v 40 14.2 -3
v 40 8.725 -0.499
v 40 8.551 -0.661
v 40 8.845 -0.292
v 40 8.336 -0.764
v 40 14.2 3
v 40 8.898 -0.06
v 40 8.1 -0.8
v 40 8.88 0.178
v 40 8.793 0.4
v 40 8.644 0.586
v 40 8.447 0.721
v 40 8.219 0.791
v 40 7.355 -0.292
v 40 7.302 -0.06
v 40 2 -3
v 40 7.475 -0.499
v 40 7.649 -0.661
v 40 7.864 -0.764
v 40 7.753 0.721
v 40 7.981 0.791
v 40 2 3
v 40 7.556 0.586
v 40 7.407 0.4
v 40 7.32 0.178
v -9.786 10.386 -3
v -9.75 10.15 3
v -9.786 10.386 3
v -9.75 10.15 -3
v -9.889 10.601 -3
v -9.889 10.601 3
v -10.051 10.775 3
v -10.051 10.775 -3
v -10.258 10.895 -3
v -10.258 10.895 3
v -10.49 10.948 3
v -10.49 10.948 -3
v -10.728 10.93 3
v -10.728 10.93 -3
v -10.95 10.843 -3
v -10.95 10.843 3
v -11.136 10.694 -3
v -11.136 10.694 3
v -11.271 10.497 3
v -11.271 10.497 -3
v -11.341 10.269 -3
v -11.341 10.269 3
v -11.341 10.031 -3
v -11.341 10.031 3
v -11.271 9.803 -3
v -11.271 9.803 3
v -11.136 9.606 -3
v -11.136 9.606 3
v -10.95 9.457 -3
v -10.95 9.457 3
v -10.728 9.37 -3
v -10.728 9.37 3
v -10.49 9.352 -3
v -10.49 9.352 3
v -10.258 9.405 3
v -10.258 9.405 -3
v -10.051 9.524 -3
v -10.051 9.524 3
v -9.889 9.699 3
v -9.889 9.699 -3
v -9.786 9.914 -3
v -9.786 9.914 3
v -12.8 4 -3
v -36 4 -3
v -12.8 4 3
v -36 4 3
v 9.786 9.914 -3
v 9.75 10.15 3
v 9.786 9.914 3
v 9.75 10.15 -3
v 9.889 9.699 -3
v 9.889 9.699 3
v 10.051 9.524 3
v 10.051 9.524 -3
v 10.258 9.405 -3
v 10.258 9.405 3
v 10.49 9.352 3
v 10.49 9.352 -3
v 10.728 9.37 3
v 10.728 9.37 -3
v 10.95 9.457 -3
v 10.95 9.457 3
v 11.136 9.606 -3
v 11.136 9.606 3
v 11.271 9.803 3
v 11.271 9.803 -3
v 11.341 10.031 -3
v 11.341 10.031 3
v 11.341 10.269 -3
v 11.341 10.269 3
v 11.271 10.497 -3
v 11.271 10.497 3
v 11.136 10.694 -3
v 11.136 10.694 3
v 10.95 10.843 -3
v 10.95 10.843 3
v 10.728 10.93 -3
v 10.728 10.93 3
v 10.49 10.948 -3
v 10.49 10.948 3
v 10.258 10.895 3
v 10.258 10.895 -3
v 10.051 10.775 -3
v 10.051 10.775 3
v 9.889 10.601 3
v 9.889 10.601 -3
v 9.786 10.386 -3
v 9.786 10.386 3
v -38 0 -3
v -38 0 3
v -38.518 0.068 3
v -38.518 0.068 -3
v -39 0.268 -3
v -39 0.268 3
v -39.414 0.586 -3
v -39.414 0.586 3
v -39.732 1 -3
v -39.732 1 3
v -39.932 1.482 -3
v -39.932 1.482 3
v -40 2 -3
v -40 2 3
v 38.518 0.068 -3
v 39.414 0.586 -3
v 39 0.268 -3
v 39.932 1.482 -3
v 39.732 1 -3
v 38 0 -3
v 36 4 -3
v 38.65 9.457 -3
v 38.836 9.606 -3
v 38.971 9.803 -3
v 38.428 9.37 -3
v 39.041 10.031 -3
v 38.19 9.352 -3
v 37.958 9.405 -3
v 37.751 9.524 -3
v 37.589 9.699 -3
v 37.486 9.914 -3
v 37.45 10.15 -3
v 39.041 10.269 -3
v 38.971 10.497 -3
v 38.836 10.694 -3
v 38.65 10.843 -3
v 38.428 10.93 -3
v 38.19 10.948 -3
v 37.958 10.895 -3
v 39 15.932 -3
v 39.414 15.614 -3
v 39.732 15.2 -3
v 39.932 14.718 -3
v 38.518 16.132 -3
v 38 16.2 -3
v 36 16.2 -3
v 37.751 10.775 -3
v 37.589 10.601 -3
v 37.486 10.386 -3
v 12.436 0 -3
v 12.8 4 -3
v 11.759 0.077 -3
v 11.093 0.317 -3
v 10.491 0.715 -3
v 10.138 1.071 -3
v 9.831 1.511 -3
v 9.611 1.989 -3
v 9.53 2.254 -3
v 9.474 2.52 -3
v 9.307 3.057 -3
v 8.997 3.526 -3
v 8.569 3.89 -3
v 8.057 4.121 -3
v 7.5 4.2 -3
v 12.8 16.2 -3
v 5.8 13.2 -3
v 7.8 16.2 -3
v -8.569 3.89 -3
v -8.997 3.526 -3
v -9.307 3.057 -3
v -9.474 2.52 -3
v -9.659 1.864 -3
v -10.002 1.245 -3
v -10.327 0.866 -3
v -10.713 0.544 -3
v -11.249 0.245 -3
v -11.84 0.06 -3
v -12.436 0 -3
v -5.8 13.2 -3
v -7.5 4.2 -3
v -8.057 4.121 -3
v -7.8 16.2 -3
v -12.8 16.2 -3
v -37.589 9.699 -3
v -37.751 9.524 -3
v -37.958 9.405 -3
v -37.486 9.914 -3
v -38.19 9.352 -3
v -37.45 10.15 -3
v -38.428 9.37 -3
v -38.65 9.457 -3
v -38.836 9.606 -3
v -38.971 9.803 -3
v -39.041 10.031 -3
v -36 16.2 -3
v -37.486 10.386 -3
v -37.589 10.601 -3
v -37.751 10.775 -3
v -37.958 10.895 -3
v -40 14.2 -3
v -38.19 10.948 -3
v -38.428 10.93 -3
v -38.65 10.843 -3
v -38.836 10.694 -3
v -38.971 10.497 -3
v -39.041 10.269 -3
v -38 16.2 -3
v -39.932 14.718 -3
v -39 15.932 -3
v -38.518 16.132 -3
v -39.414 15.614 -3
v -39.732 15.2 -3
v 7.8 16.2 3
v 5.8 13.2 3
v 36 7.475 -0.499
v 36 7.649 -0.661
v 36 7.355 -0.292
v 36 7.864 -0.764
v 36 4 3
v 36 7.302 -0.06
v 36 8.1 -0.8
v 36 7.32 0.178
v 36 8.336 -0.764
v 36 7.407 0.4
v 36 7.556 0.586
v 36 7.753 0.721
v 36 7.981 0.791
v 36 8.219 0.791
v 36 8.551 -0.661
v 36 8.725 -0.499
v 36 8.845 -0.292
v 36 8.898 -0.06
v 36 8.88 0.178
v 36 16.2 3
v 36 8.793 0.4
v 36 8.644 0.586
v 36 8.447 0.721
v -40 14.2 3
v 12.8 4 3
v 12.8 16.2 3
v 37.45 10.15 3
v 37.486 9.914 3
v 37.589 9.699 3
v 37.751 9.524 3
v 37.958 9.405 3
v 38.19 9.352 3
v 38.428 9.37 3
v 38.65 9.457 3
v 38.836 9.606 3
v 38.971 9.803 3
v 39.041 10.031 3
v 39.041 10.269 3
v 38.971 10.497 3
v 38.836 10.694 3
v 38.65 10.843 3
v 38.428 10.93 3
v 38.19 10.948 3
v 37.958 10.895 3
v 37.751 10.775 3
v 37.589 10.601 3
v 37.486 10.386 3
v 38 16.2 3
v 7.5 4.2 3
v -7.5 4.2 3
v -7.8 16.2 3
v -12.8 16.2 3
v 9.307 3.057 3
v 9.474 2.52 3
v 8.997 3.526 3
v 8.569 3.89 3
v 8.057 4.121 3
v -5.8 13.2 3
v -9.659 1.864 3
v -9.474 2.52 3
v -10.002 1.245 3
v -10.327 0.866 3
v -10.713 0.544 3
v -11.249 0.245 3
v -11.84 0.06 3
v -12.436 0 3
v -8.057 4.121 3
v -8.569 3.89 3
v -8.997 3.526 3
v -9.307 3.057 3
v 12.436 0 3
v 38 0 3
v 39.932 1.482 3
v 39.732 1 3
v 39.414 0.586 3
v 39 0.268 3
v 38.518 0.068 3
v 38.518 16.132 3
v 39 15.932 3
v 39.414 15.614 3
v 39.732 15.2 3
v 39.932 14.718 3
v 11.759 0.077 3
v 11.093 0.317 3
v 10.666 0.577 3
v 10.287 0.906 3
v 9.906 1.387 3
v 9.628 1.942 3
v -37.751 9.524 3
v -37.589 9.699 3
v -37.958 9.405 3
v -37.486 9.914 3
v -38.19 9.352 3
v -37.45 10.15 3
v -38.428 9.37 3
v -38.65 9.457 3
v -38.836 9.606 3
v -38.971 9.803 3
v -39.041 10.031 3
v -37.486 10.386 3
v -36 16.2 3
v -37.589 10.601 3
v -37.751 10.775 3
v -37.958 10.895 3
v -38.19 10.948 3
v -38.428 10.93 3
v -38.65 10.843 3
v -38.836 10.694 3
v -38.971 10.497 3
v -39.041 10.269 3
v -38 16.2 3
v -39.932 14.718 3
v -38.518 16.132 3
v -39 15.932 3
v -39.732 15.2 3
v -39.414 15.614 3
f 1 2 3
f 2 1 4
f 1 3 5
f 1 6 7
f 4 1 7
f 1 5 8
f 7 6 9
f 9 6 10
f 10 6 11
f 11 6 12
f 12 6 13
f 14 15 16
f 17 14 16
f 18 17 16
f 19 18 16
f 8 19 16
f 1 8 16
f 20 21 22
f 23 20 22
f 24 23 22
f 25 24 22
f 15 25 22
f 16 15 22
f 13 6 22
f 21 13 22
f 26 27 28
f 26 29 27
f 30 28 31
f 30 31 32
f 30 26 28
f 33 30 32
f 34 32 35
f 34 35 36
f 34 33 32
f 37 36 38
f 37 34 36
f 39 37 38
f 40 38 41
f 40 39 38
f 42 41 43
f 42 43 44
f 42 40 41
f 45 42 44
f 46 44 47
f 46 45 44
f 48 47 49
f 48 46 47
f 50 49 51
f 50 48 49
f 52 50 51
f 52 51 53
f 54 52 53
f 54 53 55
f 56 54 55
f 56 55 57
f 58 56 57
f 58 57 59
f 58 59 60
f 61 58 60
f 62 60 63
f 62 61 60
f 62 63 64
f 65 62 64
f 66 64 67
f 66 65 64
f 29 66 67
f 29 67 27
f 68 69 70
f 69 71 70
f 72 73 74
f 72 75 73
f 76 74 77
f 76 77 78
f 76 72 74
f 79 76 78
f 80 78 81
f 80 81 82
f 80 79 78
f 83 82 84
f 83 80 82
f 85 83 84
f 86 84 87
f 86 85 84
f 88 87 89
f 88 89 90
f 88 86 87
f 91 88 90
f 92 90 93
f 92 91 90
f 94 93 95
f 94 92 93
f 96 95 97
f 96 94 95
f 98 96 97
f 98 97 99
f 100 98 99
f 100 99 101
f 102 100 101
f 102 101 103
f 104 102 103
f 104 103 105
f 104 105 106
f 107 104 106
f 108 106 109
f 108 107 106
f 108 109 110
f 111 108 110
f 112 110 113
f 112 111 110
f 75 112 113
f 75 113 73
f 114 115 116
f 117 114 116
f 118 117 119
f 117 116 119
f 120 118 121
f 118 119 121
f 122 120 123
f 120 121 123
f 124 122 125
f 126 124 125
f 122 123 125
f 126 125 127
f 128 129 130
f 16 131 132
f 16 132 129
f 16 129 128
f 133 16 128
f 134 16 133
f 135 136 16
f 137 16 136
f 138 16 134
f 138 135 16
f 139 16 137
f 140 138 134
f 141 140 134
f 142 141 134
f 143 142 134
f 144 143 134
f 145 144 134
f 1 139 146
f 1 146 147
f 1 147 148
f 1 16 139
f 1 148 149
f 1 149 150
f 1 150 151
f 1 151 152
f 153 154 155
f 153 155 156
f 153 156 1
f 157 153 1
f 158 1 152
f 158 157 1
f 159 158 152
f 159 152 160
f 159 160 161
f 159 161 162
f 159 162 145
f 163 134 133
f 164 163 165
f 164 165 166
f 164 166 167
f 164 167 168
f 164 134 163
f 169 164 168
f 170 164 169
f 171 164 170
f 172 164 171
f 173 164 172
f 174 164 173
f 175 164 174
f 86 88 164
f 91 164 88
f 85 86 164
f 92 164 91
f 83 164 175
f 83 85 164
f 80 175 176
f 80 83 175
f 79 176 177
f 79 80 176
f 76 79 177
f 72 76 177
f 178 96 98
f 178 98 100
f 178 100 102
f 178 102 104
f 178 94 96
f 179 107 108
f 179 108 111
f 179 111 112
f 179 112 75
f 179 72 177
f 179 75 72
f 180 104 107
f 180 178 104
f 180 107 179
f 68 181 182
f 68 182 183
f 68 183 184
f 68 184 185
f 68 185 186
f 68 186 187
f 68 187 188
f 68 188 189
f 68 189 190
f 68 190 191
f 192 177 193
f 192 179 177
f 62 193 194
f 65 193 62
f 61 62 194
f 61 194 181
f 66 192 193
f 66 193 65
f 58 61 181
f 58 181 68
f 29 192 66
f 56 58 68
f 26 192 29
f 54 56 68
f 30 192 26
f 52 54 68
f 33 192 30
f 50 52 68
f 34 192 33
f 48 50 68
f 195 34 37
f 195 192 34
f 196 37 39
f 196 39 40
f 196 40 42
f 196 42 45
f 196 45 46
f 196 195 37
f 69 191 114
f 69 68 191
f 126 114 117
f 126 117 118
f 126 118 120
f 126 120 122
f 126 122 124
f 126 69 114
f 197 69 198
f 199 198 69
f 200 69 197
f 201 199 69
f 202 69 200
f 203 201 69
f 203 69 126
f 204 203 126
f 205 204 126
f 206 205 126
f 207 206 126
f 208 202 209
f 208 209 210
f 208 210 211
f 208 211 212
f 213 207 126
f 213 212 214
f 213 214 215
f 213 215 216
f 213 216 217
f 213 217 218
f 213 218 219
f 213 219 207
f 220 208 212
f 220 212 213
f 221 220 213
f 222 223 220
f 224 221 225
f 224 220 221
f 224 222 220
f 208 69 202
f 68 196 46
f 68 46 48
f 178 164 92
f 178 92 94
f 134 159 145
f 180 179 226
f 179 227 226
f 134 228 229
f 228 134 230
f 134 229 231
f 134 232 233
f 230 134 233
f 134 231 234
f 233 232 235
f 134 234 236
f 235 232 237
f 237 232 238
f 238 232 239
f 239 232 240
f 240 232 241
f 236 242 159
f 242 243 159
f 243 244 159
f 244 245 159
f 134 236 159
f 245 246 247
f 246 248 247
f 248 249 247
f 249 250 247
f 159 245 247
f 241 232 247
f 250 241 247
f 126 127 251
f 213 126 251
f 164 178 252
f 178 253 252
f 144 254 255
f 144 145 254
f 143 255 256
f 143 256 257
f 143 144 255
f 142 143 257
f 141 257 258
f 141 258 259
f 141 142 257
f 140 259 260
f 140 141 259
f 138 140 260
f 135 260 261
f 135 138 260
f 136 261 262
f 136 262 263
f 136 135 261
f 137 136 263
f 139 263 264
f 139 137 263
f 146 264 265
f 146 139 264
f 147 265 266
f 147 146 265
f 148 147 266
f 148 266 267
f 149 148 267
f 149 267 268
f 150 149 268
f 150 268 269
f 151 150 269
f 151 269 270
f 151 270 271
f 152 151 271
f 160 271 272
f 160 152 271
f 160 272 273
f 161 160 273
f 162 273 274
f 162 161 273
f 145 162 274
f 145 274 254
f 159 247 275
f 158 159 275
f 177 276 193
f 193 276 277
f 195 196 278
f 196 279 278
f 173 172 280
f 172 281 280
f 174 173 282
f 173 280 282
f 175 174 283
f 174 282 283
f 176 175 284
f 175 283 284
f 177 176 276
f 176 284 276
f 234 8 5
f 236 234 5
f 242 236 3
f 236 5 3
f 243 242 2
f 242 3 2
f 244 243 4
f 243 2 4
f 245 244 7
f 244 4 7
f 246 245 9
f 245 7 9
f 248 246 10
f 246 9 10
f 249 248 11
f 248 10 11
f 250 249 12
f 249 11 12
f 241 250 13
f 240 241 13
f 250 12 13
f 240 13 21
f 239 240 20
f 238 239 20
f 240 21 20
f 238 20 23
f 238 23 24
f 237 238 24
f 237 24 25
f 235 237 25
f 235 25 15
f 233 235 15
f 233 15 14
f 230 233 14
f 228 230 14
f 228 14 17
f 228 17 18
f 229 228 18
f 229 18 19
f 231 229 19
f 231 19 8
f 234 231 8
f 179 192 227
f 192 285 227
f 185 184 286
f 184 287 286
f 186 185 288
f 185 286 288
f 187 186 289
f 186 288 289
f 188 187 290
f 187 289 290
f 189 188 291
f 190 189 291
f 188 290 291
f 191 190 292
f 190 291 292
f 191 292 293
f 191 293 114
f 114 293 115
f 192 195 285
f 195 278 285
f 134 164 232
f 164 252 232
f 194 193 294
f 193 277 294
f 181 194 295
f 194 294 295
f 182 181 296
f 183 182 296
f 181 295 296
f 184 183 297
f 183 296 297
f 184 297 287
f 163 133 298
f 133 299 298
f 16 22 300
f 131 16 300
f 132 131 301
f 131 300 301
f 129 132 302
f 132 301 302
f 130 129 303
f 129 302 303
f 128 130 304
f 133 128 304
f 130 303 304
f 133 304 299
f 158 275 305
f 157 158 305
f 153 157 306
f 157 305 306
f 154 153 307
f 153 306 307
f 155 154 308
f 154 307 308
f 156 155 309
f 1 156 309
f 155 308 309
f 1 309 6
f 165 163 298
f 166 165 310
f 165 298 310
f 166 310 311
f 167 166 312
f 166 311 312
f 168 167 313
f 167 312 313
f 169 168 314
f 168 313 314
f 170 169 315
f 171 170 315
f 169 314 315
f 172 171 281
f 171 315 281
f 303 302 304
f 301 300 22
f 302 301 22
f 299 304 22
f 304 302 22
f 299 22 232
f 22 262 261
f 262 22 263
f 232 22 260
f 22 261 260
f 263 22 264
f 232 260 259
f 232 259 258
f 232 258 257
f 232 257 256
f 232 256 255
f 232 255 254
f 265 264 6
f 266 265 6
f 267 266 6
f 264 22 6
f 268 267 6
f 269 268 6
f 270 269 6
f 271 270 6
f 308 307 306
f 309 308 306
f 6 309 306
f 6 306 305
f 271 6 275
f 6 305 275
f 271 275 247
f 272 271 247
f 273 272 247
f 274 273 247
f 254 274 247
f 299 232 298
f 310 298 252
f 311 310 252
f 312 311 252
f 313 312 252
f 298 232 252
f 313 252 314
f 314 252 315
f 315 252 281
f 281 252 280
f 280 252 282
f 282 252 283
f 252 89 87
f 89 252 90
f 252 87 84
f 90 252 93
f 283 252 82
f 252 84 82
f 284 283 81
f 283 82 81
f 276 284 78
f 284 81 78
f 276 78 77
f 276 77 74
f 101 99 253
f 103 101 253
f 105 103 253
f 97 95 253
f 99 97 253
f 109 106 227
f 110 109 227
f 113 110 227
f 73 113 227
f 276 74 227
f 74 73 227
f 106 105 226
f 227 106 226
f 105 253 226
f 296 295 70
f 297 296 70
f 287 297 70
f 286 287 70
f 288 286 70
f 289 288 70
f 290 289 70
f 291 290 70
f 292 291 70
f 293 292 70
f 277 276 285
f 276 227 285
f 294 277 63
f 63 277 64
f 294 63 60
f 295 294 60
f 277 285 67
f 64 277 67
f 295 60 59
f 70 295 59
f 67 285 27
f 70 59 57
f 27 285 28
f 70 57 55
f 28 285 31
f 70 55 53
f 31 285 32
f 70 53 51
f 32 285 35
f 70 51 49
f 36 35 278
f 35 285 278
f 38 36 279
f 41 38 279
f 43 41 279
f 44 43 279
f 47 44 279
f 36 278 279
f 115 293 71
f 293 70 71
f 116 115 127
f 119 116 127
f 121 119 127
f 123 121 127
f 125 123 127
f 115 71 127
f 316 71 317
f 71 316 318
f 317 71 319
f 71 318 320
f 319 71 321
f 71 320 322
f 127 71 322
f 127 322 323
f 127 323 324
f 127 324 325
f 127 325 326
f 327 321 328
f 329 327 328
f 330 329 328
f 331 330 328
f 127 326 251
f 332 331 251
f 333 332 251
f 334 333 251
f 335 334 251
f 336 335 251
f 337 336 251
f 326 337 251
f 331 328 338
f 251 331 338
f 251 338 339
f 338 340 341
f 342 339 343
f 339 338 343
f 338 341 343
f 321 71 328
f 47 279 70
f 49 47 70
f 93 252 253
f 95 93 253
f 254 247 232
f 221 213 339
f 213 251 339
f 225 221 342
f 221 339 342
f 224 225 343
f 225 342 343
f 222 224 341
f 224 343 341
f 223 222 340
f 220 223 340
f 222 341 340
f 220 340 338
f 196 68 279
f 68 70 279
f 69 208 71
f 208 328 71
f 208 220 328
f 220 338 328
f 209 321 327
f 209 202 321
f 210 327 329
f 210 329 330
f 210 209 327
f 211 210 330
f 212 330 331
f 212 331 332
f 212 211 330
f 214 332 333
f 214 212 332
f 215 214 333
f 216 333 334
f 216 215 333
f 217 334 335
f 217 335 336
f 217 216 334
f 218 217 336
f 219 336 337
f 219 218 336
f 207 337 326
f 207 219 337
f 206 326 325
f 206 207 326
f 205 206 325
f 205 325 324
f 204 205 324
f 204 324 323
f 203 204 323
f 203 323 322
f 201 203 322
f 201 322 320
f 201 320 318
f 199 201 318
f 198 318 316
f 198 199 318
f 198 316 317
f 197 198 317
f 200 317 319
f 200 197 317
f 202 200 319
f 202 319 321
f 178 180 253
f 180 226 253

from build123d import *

# Parameters (mm, degrees)
IZIM1_R                     = 0.8
Y_KSEKLIK_EKSTR_ZYON1_DEPTH = 3
RADYUS1_R                   = 3
KES_EKSTR_ZYON5_REACH       = 83.679
IZIM6_R                     = 0.8


with BuildPart() as part:
    # Çizim1 → Yükseklik-Ekstrüzyon1 (new, symmetric)
    with BuildSketch(Plane.XY):
        with BuildLine():
            Line((-40, 2), (-40, 14.2))
            ThreePointArc((-40, 14.2), (-39.414213562, 15.614213562), (-38, 16.2))
            Line((-38, 16.2), (-36, 16.2))
            Line((-36, 16.2), (-36, 4))
            Line((-36, 4), (-12.8, 4))
            Line((-12.8, 4), (-12.8, 16.2))
            Line((-12.8, 16.2), (-7.8, 16.2))
            Line((-7.8, 16.2), (-5.8, 13.199942957))
            Line((-5.8, 13.199942957), (5.8, 13.199942957))
            Line((5.8, 13.199942957), (7.8, 16.2))
            Line((7.8, 16.2), (11, 16.2))
            Line((11, 16.2), (12.8, 16.2))
            Line((12.8, 16.2), (12.8, 4))
            Line((12.8, 4), (36, 4))
            Line((36, 4), (36, 16.2))
            Line((36, 16.2), (38, 16.2))
            ThreePointArc((38, 16.2), (39.414213562, 15.614213562), (40, 14.2))
            Line((40, 14.2), (40, 2))
            ThreePointArc((40, 2), (39.414213562, 0.585786438), (38, 0))
            Line((38, 0), (9.5, 0))
            Line((9.5, 0), (9.5, 2.199942957))
            ThreePointArc((9.5, 2.199942957), (8.914213562, 3.614156519), (7.5, 4.199942957))
            Line((7.5, 4.199942957), (-7.5, 4.199942957))
            ThreePointArc((-7.5, 4.199942957), (-8.914213562, 3.614156519), (-9.5, 2.199942957))
            Line((-9.5, 2.199942957), (-9.5, 0))
            Line((-9.5, 0), (-38, 0))
            ThreePointArc((-38, 0), (-39.414213562, 0.585786438), (-40, 2))
        make_face()
        with Locations((-10.55, 10.149944348)):
            Circle(IZIM1_R, mode=Mode.SUBTRACT)
        with Locations((-38.25, 10.149944348)):
            Circle(IZIM1_R, mode=Mode.SUBTRACT)
        with Locations(Location((38.25, 10.149944348, 0), (0, 0, 180))):
            Circle(IZIM1_R, mode=Mode.SUBTRACT)
        with Locations(Location((10.55, 10.149944348, 0), (0, 0, 180))):
            Circle(IZIM1_R, mode=Mode.SUBTRACT)
    extrude(amount=Y_KSEKLIK_EKSTR_ZYON1_DEPTH, both=True)

    # Radyus1
    radyus1_edges = [part.edges().sort_by_distance(p)[0] for p in [
        (9.5, 0, 0),
        (-9.5, 0, 0),
    ]]
    fillet(radyus1_edges, radius=RADYUS1_R)

    # Çizim6 → Kes-Ekstrüzyon5 (cut, up to next)
    with BuildSketch(Plane(origin=(40, 0, 0), x_dir=(0, 0, -1), z_dir=(1, 0, 0)), mode=Mode.PRIVATE) as kes_ekstr_zyon5_sk1:
        with Locations((0, 8.1)):
            Circle(IZIM6_R)
    kes_ekstr_zyon5_tool1 = extrude(kes_ekstr_zyon5_sk1.sketch, amount=-KES_EKSTR_ZYON5_REACH, mode=Mode.PRIVATE) & part.part
    add(kes_ekstr_zyon5_tool1.solids().sort_by_distance((40, 8.1, 0))[0], mode=Mode.SUBTRACT)


solid = part.part
